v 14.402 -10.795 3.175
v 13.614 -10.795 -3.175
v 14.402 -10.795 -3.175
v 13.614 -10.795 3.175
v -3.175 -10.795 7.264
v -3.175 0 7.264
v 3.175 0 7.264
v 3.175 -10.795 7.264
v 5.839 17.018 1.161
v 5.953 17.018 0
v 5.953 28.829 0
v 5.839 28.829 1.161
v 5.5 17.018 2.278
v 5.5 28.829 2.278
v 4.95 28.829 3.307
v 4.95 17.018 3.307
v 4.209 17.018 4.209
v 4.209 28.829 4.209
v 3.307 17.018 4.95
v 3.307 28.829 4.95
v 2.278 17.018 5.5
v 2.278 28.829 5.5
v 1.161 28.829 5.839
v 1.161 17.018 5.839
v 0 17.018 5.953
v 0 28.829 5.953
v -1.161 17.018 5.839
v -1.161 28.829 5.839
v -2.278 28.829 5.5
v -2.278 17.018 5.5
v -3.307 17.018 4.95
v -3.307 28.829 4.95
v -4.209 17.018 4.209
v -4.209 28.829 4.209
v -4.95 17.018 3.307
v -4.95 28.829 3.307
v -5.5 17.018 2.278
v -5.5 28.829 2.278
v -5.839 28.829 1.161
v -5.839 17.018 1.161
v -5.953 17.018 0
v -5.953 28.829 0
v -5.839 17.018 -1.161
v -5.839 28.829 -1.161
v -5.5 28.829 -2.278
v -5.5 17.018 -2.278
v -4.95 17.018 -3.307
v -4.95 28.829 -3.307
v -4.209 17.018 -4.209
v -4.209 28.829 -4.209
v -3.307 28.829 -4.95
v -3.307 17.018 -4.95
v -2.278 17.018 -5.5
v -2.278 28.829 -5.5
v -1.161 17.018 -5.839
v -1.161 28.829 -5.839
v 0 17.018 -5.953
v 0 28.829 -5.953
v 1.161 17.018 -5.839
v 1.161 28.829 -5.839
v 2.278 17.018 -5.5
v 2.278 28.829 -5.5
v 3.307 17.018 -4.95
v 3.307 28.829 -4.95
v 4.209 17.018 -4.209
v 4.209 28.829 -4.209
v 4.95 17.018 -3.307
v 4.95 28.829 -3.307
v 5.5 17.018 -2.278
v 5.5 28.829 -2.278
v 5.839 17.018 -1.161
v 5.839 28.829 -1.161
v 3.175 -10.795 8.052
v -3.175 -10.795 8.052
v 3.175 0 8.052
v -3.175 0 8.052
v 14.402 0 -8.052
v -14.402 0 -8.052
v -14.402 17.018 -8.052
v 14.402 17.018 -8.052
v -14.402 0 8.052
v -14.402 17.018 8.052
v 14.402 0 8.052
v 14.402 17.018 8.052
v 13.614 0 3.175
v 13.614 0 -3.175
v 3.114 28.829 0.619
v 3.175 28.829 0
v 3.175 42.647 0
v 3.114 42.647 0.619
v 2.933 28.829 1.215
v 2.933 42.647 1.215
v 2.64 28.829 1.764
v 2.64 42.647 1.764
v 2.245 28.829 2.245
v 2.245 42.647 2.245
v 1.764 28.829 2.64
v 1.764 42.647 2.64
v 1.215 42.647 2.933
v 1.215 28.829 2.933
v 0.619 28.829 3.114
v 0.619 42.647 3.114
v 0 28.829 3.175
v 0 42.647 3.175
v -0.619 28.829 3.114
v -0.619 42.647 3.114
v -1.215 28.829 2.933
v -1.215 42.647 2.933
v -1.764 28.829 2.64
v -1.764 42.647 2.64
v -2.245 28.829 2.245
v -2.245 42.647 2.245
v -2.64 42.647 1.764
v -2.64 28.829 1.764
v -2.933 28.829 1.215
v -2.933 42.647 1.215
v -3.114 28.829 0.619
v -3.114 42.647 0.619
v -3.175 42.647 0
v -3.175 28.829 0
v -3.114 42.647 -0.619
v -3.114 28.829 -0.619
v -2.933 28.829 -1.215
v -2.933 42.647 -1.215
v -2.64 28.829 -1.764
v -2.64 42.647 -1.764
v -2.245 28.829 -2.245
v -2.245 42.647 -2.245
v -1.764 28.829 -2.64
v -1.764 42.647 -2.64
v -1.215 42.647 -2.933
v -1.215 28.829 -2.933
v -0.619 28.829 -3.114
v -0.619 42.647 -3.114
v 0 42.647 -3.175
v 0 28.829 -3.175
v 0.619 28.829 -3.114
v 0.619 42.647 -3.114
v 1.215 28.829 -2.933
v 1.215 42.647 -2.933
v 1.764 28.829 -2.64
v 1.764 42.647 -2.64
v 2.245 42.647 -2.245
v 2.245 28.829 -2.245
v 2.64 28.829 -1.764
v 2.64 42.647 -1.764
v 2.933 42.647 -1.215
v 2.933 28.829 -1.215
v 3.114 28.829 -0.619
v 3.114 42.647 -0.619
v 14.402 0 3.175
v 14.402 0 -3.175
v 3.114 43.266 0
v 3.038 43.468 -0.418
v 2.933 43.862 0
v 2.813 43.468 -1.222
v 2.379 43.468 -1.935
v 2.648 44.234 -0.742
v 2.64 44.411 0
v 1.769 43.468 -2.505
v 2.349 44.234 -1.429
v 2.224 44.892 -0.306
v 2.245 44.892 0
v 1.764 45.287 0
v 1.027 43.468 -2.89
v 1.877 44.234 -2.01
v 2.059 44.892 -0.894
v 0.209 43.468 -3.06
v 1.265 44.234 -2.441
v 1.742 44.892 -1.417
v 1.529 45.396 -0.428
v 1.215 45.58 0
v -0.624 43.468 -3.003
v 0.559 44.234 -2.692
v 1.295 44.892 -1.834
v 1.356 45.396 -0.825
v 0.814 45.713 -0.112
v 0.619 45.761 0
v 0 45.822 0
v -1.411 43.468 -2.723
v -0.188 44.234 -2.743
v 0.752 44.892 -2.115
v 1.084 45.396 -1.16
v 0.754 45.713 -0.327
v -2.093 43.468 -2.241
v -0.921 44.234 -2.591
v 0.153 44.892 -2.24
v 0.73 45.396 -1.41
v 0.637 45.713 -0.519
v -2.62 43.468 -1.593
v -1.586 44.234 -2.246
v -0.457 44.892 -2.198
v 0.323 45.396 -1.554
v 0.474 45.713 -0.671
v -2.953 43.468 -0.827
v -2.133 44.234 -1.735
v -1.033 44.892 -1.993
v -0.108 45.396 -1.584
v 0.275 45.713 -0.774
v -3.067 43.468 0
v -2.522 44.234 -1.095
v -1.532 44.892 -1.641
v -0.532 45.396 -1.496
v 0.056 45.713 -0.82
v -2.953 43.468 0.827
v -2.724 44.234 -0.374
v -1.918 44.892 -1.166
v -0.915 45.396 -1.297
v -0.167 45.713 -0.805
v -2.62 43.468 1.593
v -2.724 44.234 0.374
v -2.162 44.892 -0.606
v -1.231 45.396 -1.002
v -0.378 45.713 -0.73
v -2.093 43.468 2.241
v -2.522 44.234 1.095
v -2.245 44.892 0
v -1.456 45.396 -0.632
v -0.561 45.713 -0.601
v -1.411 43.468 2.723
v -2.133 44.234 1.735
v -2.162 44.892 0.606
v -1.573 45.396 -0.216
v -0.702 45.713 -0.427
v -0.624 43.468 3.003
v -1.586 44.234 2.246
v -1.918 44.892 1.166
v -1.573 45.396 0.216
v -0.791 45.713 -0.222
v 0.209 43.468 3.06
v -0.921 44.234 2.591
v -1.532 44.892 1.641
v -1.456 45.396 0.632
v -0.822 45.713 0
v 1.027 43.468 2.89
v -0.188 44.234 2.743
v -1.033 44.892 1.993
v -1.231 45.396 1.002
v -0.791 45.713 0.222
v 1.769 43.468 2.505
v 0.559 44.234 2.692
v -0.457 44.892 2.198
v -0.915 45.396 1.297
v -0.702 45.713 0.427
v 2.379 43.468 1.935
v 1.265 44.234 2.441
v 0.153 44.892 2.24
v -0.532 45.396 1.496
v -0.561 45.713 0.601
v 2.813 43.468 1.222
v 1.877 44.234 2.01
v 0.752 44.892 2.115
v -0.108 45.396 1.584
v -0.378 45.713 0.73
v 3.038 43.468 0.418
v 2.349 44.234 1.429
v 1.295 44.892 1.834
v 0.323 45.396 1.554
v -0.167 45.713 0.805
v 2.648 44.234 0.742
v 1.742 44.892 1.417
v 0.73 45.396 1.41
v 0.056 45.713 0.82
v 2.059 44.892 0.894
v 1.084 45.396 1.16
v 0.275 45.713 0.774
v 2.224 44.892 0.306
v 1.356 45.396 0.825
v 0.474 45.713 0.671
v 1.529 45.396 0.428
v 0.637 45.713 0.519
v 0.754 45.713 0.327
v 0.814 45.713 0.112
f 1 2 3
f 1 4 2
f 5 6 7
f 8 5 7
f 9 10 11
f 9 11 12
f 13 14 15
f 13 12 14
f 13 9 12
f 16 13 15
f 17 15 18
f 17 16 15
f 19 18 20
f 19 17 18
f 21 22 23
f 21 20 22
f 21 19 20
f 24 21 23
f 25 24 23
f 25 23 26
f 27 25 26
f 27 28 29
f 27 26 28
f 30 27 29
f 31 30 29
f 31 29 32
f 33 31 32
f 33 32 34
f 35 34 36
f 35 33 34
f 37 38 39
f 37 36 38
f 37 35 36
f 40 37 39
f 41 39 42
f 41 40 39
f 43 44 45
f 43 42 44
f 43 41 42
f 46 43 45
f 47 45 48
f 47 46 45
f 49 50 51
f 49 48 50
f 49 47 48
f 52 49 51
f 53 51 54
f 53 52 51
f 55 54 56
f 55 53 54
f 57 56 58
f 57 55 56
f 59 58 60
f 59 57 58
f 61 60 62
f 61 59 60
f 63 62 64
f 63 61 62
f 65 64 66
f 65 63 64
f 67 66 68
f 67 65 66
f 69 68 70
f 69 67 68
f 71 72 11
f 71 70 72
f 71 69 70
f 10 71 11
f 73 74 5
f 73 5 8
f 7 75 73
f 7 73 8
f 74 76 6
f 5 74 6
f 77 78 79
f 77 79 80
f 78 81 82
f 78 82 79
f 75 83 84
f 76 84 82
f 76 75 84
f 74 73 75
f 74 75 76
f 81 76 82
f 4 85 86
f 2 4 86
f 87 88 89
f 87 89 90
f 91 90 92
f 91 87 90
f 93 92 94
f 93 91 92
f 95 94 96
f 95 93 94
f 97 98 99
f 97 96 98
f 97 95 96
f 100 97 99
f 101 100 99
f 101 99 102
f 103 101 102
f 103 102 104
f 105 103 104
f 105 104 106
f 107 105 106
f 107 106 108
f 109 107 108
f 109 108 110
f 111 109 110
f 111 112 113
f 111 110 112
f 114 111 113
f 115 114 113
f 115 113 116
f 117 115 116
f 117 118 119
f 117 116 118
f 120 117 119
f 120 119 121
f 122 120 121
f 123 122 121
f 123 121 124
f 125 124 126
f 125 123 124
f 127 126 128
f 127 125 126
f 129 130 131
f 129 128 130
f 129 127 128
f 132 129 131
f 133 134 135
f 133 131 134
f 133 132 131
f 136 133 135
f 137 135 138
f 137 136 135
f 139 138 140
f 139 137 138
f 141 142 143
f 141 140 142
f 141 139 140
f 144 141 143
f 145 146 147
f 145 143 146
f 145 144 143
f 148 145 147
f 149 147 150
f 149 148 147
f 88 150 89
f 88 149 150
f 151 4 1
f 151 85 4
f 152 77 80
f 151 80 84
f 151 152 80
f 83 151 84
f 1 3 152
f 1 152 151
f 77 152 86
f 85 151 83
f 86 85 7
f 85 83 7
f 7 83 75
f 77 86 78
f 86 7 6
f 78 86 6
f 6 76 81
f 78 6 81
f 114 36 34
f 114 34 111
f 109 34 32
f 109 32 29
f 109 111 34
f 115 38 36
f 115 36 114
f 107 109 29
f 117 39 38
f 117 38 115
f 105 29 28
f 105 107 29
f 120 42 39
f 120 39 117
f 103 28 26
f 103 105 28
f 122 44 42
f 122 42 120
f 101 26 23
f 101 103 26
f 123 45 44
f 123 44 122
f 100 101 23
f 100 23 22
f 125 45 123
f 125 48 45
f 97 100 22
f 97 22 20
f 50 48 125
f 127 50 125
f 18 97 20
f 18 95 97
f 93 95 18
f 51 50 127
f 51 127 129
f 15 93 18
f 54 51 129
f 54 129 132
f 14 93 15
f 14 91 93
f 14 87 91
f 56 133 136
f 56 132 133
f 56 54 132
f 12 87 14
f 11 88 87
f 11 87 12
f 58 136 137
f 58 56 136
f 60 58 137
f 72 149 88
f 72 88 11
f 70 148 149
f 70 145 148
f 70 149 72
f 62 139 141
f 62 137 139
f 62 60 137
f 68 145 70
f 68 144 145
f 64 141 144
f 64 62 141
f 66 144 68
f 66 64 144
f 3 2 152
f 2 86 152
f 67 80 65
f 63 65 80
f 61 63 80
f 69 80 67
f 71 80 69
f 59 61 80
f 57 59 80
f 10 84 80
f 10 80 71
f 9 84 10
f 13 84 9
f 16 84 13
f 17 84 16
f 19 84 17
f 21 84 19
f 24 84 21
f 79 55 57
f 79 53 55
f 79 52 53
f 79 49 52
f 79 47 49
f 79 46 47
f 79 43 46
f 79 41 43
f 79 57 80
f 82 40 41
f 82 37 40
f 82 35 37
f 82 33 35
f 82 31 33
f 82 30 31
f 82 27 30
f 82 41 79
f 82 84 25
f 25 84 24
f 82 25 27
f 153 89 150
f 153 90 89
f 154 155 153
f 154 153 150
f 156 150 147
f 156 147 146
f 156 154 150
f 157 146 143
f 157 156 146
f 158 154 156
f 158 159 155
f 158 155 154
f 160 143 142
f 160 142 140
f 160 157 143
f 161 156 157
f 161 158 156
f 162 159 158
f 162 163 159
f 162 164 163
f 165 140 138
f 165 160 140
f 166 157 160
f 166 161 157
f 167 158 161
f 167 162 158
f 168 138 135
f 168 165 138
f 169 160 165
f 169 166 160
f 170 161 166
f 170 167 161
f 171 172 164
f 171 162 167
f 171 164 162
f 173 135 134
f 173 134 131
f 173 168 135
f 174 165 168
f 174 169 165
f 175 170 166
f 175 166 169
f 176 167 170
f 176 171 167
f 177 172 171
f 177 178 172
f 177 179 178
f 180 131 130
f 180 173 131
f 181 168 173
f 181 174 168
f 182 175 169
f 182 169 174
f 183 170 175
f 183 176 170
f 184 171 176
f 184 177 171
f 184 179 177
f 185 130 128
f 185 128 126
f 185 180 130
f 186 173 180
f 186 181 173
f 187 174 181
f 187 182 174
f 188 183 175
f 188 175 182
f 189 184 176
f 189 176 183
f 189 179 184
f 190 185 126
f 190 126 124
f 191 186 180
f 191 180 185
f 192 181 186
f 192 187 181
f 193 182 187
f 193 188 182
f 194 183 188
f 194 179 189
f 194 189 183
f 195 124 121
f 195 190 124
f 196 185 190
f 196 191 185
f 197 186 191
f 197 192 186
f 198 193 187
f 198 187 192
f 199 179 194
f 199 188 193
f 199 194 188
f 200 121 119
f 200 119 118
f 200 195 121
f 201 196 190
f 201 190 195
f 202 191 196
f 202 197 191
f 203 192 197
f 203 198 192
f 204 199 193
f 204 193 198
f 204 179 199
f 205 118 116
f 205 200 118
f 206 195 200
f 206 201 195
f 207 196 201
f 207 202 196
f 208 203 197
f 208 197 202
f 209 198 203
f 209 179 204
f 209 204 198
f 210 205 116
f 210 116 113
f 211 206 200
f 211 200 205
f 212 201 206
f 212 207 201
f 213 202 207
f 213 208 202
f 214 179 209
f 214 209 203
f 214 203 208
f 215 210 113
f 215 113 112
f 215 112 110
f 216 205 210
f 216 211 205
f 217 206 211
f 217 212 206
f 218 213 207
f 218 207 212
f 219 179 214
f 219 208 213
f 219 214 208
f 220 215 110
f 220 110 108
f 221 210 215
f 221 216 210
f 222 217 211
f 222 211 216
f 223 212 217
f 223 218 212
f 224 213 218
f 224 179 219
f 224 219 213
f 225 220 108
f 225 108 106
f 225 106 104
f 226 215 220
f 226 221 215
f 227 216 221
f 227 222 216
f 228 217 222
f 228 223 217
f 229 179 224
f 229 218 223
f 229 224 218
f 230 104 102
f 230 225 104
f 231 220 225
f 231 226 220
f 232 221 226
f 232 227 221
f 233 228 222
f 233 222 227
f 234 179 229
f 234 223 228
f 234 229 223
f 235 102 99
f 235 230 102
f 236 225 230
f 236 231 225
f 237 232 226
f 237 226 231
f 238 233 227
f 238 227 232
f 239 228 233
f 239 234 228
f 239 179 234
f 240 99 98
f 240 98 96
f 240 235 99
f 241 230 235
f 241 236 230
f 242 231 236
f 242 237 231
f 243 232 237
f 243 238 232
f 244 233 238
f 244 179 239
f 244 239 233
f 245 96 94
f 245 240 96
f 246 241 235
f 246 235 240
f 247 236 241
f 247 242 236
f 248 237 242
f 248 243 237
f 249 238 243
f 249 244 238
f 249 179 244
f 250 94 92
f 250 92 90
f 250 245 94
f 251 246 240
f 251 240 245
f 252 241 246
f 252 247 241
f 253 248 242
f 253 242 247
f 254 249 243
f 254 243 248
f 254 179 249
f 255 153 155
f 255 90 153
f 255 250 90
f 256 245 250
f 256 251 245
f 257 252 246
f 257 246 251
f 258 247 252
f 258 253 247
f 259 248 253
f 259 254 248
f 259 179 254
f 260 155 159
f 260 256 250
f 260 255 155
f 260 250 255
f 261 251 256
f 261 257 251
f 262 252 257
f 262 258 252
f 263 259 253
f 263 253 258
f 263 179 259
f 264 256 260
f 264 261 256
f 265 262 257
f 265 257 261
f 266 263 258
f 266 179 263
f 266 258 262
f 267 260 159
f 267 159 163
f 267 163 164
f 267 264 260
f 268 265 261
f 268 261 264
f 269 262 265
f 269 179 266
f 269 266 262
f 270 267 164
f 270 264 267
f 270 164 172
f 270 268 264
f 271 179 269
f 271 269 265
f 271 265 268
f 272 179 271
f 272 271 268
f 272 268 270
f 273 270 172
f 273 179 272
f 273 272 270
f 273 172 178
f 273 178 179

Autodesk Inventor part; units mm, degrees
ref_plane "YZ Plane" through (0, 0, 0) normal (1, 0, 0) x (0, 1, 0)
ref_plane "XZ Plane" through (0, 0, 0) normal (0, 1, 0) x (-1, 0, 0)
ref_plane "XY Plane" through (0, 0, 0) normal (0, 0, 1) x (1, 0, 0)
sketch "Sketch1" plane through (0, 0, 0) normal (0, 1, 0) x (-1, 0, 0)
  line L0 (-14.4018, 8.0518) -> (14.4018, 8.0518)
  line L1 (14.4018, 8.0518) -> (14.4018, -8.0518)
  line L2 (14.4018, -8.0518) -> (-14.4018, -8.0518)
  line L3 (-14.4018, -8.0518) -> (-14.4018, 8.0518)
  line L4 (-14.4018, 8.0518) -> (14.4018, -8.0518) construction
  line L5 (14.4018, 8.0518) -> (-14.4018, -8.0518) construction
  point P0 (0, 0)
  dimension "d0" = 28.8036
  dimension "d1" = 16.1036
extrude "Extrusion1" add sketch "Sketch1" along normal blind 17.018
sketch "Sketch2" plane through (0, 17.018, 0) normal (0, 1, 0) x (1, 0, 0)
  circle A0 centre (0, 0) radius 5.9531
  dimension "d4" = 11.9062
extrude "Extrusion2" add sketch "Sketch2" along normal blind 11.811
sketch "Sketch3" plane through (0, 28.829, 0) normal (0, 1, 0) x (1, 0, 0)
  circle A0 centre (0, 0) radius 3.175
  dimension "d7" = 6.35
extrude "Extrusion3" add sketch "Sketch3" along normal blind 16.9926
fillet "Fillet1" radius 3.175 1 edges at (-3.175, 45.8216, 0)
sketch "Sketch4" plane through (0, 0, 0) normal (0, -1, 0) x (1, 0, 0)
  line L0 (-14.4018, 8.0518) -> (14.4018, 8.0518) projected
  line L1 (0, 8.0518) -> (3.175, 8.0518)
  line L2 (3.175, 8.0518) -> (3.175, 7.2644)
  line L3 (3.175, 7.2644) -> (0, 7.2644)
  line L4 (0, 7.2644) -> (0, 8.0518)
  line L5 (0, 8.0518) -> (-3.175, 8.0518)
  line L6 (-3.175, 8.0518) -> (-3.175, 7.2644)
  line L7 (-3.175, 7.2644) -> (0, 7.2644)
  point P0 (0, 0)
  dimension "d11" = 3.175
  dimension "d12" = 0.7874
extrude "Extrusion4" add sketch "Sketch4" along normal blind 10.795
sketch "Sketch5" plane through (0, 0, 0) normal (0, -1, 0) x (1, 0, 0)
  line L0 (14.4018, -8.0518) -> (14.4018, 8.0518) projected
  line L1 (14.4018, 0) -> (13.6144, 0)
  line L2 (13.6144, 0) -> (13.6144, 3.175)
  line L3 (13.6144, 3.175) -> (14.4018, 3.175)
  line L4 (14.4018, 3.175) -> (14.4018, 0)
  line L5 (13.6144, 0) -> (13.6144, -3.175)
  line L6 (13.6144, -3.175) -> (14.4018, -3.175)
  line L7 (14.4018, -3.175) -> (14.4018, 0)
  point P0 (0, 0)
  dimension "d15" = 0.7874
  dimension "d16" = 3.175
extrude "Extrusion5" add sketch "Sketch5" along normal blind 10.795
properties part number "switch toggle"
